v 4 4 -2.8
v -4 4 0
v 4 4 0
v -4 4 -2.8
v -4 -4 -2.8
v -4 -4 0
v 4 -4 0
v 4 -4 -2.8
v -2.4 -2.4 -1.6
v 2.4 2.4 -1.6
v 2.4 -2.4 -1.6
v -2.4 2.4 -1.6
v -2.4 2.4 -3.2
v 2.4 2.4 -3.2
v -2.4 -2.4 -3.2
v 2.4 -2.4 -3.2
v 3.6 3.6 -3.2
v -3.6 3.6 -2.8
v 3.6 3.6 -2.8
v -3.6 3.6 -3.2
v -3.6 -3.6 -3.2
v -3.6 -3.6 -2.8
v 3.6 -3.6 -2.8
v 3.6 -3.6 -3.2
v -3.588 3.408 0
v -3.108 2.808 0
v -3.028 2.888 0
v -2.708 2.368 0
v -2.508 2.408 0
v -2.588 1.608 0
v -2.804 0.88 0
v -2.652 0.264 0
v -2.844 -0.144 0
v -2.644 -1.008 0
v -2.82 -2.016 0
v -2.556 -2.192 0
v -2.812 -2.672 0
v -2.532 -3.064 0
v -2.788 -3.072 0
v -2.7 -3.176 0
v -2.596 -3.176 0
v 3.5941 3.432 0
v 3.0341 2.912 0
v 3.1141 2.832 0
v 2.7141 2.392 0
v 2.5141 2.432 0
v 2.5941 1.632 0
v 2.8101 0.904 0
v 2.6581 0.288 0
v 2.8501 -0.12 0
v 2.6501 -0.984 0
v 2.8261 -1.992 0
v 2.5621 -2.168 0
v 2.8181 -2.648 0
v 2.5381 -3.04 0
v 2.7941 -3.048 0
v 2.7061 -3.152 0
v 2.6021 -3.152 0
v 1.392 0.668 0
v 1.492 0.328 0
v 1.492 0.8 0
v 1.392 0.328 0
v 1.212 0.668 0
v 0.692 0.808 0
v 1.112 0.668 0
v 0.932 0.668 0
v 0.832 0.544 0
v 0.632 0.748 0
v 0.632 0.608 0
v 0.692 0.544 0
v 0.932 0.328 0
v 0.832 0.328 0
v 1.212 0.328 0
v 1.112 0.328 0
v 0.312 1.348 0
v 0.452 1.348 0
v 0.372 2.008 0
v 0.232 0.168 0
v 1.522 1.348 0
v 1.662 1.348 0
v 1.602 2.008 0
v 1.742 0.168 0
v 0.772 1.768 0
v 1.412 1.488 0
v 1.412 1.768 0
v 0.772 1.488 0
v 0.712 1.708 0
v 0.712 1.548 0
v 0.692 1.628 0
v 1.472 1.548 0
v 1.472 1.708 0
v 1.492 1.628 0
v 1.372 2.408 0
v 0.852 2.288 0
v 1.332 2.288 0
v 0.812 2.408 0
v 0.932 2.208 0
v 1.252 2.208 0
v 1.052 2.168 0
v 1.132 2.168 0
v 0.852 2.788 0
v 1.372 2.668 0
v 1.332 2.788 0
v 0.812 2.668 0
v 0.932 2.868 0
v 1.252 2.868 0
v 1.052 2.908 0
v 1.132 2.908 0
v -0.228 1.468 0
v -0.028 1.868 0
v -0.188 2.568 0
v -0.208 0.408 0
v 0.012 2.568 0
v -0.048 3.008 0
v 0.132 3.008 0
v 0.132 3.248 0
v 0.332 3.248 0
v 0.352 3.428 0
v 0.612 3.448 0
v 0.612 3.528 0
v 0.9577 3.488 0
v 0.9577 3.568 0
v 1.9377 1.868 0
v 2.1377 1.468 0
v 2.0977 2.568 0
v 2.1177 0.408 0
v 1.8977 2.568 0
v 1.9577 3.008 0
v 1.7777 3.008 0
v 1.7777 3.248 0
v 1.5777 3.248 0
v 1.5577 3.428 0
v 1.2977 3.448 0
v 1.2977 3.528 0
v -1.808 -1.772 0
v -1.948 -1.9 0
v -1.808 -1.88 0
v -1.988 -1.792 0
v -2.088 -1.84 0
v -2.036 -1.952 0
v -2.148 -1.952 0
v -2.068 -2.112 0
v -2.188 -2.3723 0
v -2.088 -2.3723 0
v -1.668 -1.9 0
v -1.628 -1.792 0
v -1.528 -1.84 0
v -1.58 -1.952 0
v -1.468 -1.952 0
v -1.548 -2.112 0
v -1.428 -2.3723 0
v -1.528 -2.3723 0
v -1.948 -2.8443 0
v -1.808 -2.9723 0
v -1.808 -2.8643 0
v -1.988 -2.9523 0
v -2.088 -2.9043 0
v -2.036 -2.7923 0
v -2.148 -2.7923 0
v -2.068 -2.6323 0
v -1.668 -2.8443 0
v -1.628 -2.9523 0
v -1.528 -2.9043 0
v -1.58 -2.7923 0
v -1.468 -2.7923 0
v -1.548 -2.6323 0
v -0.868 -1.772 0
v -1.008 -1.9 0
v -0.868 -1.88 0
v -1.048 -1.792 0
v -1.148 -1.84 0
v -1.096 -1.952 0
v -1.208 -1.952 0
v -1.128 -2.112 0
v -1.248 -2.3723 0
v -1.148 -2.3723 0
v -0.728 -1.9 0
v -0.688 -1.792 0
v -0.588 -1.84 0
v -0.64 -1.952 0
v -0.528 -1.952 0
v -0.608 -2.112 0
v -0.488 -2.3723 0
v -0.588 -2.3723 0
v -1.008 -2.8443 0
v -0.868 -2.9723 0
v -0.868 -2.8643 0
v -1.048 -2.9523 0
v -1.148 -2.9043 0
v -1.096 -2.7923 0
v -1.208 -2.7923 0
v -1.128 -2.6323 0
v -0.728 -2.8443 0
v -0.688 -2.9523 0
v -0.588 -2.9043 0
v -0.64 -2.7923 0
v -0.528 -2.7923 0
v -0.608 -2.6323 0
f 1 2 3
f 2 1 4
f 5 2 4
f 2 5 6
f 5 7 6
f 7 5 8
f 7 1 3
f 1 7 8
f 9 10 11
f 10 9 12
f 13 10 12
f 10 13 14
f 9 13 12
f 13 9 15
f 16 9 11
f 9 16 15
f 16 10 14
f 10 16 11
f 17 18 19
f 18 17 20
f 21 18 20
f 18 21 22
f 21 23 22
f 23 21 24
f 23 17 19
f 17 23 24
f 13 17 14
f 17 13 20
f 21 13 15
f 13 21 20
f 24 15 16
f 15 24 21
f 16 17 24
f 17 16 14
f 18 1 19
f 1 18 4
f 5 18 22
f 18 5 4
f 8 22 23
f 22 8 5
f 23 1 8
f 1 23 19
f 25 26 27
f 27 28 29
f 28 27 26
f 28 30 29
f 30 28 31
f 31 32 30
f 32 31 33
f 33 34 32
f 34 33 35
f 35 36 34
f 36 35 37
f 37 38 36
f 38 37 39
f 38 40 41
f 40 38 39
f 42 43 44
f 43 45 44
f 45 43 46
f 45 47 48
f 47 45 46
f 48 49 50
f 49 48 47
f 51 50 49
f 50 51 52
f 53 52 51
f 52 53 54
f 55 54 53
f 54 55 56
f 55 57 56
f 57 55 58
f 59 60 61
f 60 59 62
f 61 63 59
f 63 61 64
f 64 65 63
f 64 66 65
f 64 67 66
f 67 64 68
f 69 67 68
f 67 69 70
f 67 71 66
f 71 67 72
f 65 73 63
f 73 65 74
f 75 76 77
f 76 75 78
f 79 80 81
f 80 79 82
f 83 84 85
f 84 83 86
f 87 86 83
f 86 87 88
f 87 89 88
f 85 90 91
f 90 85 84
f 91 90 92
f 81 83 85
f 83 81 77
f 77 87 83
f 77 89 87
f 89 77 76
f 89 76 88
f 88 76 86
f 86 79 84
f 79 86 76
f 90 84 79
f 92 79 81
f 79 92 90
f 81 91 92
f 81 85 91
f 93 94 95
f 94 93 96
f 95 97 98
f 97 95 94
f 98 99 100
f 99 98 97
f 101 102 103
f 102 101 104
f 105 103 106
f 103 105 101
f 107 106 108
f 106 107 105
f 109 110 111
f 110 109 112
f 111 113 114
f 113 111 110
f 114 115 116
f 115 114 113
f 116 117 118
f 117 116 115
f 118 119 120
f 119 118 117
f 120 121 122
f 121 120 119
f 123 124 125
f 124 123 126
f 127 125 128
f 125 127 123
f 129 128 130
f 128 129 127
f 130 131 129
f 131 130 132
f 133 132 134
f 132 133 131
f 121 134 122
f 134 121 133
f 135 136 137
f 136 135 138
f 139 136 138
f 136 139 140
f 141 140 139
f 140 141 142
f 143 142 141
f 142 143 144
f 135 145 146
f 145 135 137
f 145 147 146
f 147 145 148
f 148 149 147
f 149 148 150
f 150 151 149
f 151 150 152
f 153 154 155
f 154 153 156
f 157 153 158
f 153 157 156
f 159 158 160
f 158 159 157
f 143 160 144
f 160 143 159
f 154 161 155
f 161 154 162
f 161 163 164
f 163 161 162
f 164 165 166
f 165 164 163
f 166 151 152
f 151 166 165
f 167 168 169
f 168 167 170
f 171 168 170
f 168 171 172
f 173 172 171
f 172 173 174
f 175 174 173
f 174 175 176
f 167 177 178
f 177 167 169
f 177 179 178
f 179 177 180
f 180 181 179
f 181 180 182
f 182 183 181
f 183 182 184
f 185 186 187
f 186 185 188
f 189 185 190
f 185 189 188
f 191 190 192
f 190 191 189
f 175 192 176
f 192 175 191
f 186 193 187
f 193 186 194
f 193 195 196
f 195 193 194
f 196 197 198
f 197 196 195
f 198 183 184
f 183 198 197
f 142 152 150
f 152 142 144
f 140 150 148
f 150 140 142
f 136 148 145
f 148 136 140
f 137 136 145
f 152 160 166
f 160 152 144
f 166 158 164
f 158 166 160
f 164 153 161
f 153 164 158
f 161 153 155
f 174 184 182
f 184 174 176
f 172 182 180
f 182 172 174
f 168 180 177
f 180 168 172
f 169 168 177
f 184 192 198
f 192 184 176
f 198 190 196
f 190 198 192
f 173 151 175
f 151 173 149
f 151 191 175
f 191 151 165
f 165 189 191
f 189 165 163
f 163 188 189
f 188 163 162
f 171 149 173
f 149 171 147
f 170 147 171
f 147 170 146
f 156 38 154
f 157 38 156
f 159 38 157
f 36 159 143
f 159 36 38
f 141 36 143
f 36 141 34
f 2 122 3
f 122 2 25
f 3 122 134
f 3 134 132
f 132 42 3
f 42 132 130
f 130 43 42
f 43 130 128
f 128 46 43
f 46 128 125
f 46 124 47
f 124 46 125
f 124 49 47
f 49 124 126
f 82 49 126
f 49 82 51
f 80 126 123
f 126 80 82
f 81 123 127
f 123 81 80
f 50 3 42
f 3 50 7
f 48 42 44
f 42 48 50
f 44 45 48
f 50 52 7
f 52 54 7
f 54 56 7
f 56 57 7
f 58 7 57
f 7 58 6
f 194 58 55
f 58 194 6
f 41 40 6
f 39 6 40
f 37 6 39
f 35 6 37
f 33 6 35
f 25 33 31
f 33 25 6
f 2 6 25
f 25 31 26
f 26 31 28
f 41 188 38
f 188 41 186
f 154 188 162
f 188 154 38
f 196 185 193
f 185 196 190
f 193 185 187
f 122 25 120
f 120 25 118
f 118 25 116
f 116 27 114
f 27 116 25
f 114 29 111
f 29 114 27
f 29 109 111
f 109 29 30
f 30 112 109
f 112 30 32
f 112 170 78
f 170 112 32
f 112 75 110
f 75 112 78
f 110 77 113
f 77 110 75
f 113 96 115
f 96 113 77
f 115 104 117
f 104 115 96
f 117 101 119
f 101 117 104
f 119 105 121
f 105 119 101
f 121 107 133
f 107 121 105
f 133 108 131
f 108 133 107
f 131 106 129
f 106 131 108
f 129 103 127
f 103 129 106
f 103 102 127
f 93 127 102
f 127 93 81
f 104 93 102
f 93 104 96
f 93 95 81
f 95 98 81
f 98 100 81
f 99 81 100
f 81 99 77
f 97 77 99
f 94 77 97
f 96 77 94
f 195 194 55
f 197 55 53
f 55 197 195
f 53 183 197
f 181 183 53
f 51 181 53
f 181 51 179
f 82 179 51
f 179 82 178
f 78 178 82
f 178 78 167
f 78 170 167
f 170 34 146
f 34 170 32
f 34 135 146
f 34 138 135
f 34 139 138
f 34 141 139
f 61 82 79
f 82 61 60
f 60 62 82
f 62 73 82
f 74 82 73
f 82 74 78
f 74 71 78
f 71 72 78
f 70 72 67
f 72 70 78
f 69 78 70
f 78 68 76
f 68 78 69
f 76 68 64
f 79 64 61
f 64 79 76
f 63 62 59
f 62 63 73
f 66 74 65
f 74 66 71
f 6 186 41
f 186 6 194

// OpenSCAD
// file: ../p/box5.scad
use <../lib.scad>
function ldraw_lib__box5() = [
// 0 Box with 5 Faces and All Edges
// 0 Name: box5.dat
// 0 Author: James Jessiman
// 0 !LDRAW_ORG Primitive UPDATE 2012-01
// 0 !LICENSE Licensed under CC BY 4.0 : see CAreadme.txt
// 
// 0 BFC CERTIFY CCW
  [0,"BFC","CERTIFY"],
  [0,"BFC","CCW"],
// 
// 0 !HISTORY 2002-04-03 [sbliss] Modified for BFC compliance
// 0 !HISTORY 2002-04-25 [PTadmin] Official Update 2002-02
// 0 !HISTORY 2007-06-24 [PTadmin] Header formatted for Contributor Agreement
// 0 !HISTORY 2008-07-01 [PTadmin] Official Update 2008-01
// 0 !HISTORY 2012-02-16 [Philo] Changed to CCW
// 0 !HISTORY 2012-03-30 [PTadmin] Official Update 2012-01
// 
// 
// 2 24 1 1 1 -1 1 1
  [2,24,1,1,1,-1,1,1],
// 2 24 -1 1 1 -1 1 -1
  [2,24,-1,1,1,-1,1,-1],
// 2 24 -1 1 -1 1 1 -1
  [2,24,-1,1,-1,1,1,-1],
// 2 24 1 1 -1 1 1 1
  [2,24,1,1,-1,1,1,1],
// 2 24 1 0 1 -1 0 1
  [2,24,1,0,1,-1,0,1],
// 2 24 -1 0 1 -1 0 -1
  [2,24,-1,0,1,-1,0,-1],
// 2 24 -1 0 -1 1 0 -1
  [2,24,-1,0,-1,1,0,-1],
// 2 24 1 0 -1 1 0 1
  [2,24,1,0,-1,1,0,1],
// 2 24 1 0 1 1 1 1
  [2,24,1,0,1,1,1,1],
// 2 24 -1 0 1 -1 1 1
  [2,24,-1,0,1,-1,1,1],
// 2 24 1 0 -1 1 1 -1
  [2,24,1,0,-1,1,1,-1],
// 2 24 -1 0 -1 -1 1 -1
  [2,24,-1,0,-1,-1,1,-1],
// 4 16 -1 1 1 1 1 1 1 1 -1 -1 1 -1
  [4,16,-1,1,1,1,1,1,1,1,-1,-1,1,-1],
// 4 16 -1 1 1 -1 0 1 1 0 1 1 1 1
  [4,16,-1,1,1,-1,0,1,1,0,1,1,1,1],
// 4 16 -1 1 -1 -1 0 -1 -1 0 1 -1 1 1
  [4,16,-1,1,-1,-1,0,-1,-1,0,1,-1,1,1],
// 4 16 1 1 -1 1 0 -1 -1 0 -1 -1 1 -1
  [4,16,1,1,-1,1,0,-1,-1,0,-1,-1,1,-1],
// 4 16 1 1 1 1 0 1 1 0 -1 1 1 -1
  [4,16,1,1,1,1,0,1,1,0,-1,1,1,-1],
];
module ldraw_lib__box5(step=0, col=false, unit=2/5, alt=false, line=0.2, solid=!$preview)
    makepoly(ldraw_lib__box5(), step=step, col=col, unit=unit, alt=alt, line=line, solid=solid);
ldraw_lib__box5(line=0.2);
// file: ../p/box4.scad
use <../lib.scad>
function ldraw_lib__box4() = [
// 0 Box with 4 Faces (2 Parallel Pairs) and All Edges
// 0 Name: box4.dat
// 0 Author: James Jessiman
// 0 !LDRAW_ORG Primitive UPDATE 2012-01
// 0 !LICENSE Licensed under CC BY 4.0 : see CAreadme.txt
// 
// 0 BFC CERTIFY CCW
  [0,"BFC","CERTIFY"],
  [0,"BFC","CCW"],
// 
// 0 !HISTORY 2002-04-03 [sbliss] Modified for BFC compliance
// 0 !HISTORY 2002-04-25 [PTadmin] Official Update 2002-02
// 0 !HISTORY 2007-06-24 [PTadmin] Header formatted for Contributor Agreement
// 0 !HISTORY 2008-07-01 [PTadmin] Official Update 2008-01
// 0 !HISTORY 2012-02-16 [Philo] Changed to CCW
// 0 !HISTORY 2012-03-30 [PTadmin] Official Update 2012-01
// 
// 
// 2 24 1 1 1 -1 1 1
  [2,24,1,1,1,-1,1,1],
// 2 24 -1 1 1 -1 1 -1
  [2,24,-1,1,1,-1,1,-1],
// 2 24 -1 1 -1 1 1 -1
  [2,24,-1,1,-1,1,1,-1],
// 2 24 1 1 -1 1 1 1
  [2,24,1,1,-1,1,1,1],
// 2 24 1 0 1 -1 0 1
  [2,24,1,0,1,-1,0,1],
// 2 24 -1 0 1 -1 0 -1
  [2,24,-1,0,1,-1,0,-1],
// 2 24 -1 0 -1 1 0 -1
  [2,24,-1,0,-1,1,0,-1],
// 2 24 1 0 -1 1 0 1
  [2,24,1,0,-1,1,0,1],
// 2 24 1 0 1 1 1 1
  [2,24,1,0,1,1,1,1],
// 2 24 -1 0 1 -1 1 1
  [2,24,-1,0,1,-1,1,1],
// 2 24 1 0 -1 1 1 -1
  [2,24,1,0,-1,1,1,-1],
// 2 24 -1 0 -1 -1 1 -1
  [2,24,-1,0,-1,-1,1,-1],
// 4 16 -1 1 1 -1 0 1 1 0 1 1 1 1
  [4,16,-1,1,1,-1,0,1,1,0,1,1,1,1],
// 4 16 -1 1 -1 -1 0 -1 -1 0 1 -1 1 1
  [4,16,-1,1,-1,-1,0,-1,-1,0,1,-1,1,1],
// 4 16 1 1 -1 1 0 -1 -1 0 -1 -1 1 -1
  [4,16,1,1,-1,1,0,-1,-1,0,-1,-1,1,-1],
// 4 16 1 1 1 1 0 1 1 0 -1 1 1 -1
  [4,16,1,1,1,1,0,1,1,0,-1,1,1,-1],
];
module ldraw_lib__box4(step=0, col=false, unit=2/5, alt=false, line=0.2, solid=!$preview)
    makepoly(ldraw_lib__box4(), step=step, col=col, unit=unit, alt=alt, line=line, solid=solid);
ldraw_lib__box4(line=0.2);
// file: s/3070bs01.scad
use <../../lib.scad>
use <../../p/box4.scad>
use <../../p/box5.scad>
function ldraw_lib__s__3070bs01() = [
// 0 ~Tile  1 x  1 with Groove without Top Face
// 0 Name: s\3070bs01.dat
// 0 Author: Chris Dee [cwdee]
// 0 !LDRAW_ORG Subpart UPDATE 2009-02
// 0 !LICENSE Licensed under CC BY 4.0 : see CAreadme.txt
// 
// 0 BFC CERTIFY CCW
  [0,"BFC","CERTIFY"],
  [0,"BFC","CCW"],
// 
// 0 !HISTORY 2009-09-03 [PTadmin] Official Update 2009-02
// 
// 
// 1 16 0 0 0 10 0 0 0 7 0 0 0 10 box4.dat
  [1,16,0,0,0,10,0,0,0,7,0,0,0,10, ldraw_lib__box4()],
// 0 BFC INVERTNEXT
  [0,"BFC","INVERTNEXT"],
// 1 16 0 8 0 6 0 0 0 -4 0 0 0 6 box5.dat
  [1,16,0,8,0,6,0,0,0,-4,0,0,0,6, ldraw_lib__box5()],
// 1 16 0 7 0 9 0 0 0 1 0 0 0 9 box4.dat
  [1,16,0,7,0,9,0,0,0,1,0,0,0,9, ldraw_lib__box4()],
// 
// 4 16 9 8 9 6 8 6 -6 8 6 -9 8 9
  [4,16,9,8,9,6,8,6,-6,8,6,-9,8,9],
// 4 16 -9 8 9 -6 8 6 -6 8 -6 -9 8 -9
  [4,16,-9,8,9,-6,8,6,-6,8,-6,-9,8,-9],
// 4 16 -9 8 -9 -6 8 -6 6 8 -6 9 8 -9
  [4,16,-9,8,-9,-6,8,-6,6,8,-6,9,8,-9],
// 4 16 9 8 -9 6 8 -6 6 8 6 9 8 9
  [4,16,9,8,-9,6,8,-6,6,8,6,9,8,9],
// 
// 4 16 10 7 10 9 7 9 -9 7 9 -10 7 10
  [4,16,10,7,10,9,7,9,-9,7,9,-10,7,10],
// 4 16 -10 7 10 -9 7 9 -9 7 -9 -10 7 -10
  [4,16,-10,7,10,-9,7,9,-9,7,-9,-10,7,-10],
// 4 16 -10 7 -10 -9 7 -9 9 7 -9 10 7 -10
  [4,16,-10,7,-10,-9,7,-9,9,7,-9,10,7,-10],
// 4 16 10 7 -10 9 7 -9 9 7 9 10 7 10
  [4,16,10,7,-10,9,7,-9,9,7,9,10,7,10],
// 0
];
module ldraw_lib__s__3070bs01(step=0, col=false, unit=2/5, alt=false, line=0.2, solid=!$preview)
    makepoly(ldraw_lib__s__3070bs01(), step=step, col=col, unit=unit, alt=alt, line=line, solid=solid);
ldraw_lib__s__3070bs01(line=0.2);
// main file
use <../lib.scad>
use <s/3070bs01.scad>
function ldraw_lib__3070bps4() = [
// 0 Tile  1 x  1 with SW First Order Backpack Pattern
// 0 Name: 3070bps4.dat
// 0 Author: Bertrand Lequy [Berth]
// 0 !LDRAW_ORG Part UPDATE 2016-01
// 0 !LICENSE Licensed under CC BY 4.0 : see CAreadme.txt
// 
// 0 BFC CERTIFY CCW
  [0,"BFC","CERTIFY"],
  [0,"BFC","CCW"],
// 
// 0 !HISTORY 2016-12-31 [PTadmin] Official Update 2016-01
// 
// 
// 1 16 0 0 0 1 0 0 0 1 0 0 0 1 s\3070bs01.dat
  [1,16,0,0,0,1,0,0,0,1,0,0,0,1, ldraw_lib__s__3070bs01()],
// 
// 3 71 -8.97 0 8.52 -7.77 0 7.02 -7.57 0 7.22
  [3,71,-8.97,0,8.52,-7.77,0,7.02,-7.57,0,7.22],
// 4 71 -6.27 0 6.02 -7.57 0 7.22 -7.77 0 7.02 -6.77 0 5.92
  [4,71,-6.27,0,6.02,-7.57,0,7.22,-7.77,0,7.02,-6.77,0,5.92],
// 4 71 -6.47 0 4.02 -6.27 0 6.02 -6.77 0 5.92 -7.01 0 2.2
  [4,71,-6.47,0,4.02,-6.27,0,6.02,-6.77,0,5.92,-7.01,0,2.2],
// 4 71 -6.63 0 0.66 -6.47 0 4.02 -7.01 0 2.2 -7.11 0 -0.36
  [4,71,-6.63,0,0.66,-6.47,0,4.02,-7.01,0,2.2,-7.11,0,-0.36],
// 4 71 -6.61 0 -2.52 -6.63 0 0.66 -7.11 0 -0.36 -7.05 0 -5.04
  [4,71,-6.61,0,-2.52,-6.63,0,0.66,-7.11,0,-0.36,-7.05,0,-5.04],
// 4 71 -6.39 0 -5.48 -6.61 0 -2.52 -7.05 0 -5.04 -7.03 0 -6.68
  [4,71,-6.39,0,-5.48,-6.61,0,-2.52,-7.05,0,-5.04,-7.03,0,-6.68],
// 4 71 -6.39 0 -5.48 -7.03 0 -6.68 -6.97 0 -7.68 -6.33 0 -7.66
  [4,71,-6.39,0,-5.48,-7.03,0,-6.68,-6.97,0,-7.68,-6.33,0,-7.66],
// 4 71 -6.33 0 -7.66 -6.97 0 -7.68 -6.75 0 -7.94 -6.49 0 -7.94
  [4,71,-6.33,0,-7.66,-6.97,0,-7.68,-6.75,0,-7.94,-6.49,0,-7.94],
// 3 71 8.98529 0 8.58 7.58529 0 7.28 7.78529 0 7.08
  [3,71,8.98529,0,8.58,7.58529,0,7.28,7.78529,0,7.08],
// 4 71 7.78529 0 7.08 7.58529 0 7.28 6.28529 0 6.08 6.78529 0 5.98
  [4,71,7.78529,0,7.08,7.58529,0,7.28,6.28529,0,6.08,6.78529,0,5.98],
// 4 71 6.78529 0 5.98 6.28529 0 6.08 6.48529 0 4.08 7.02529 0 2.26
  [4,71,6.78529,0,5.98,6.28529,0,6.08,6.48529,0,4.08,7.02529,0,2.26],
// 4 71 7.02529 0 2.26 6.48529 0 4.08 6.64529 0 0.72 7.12529 0 -0.3
  [4,71,7.02529,0,2.26,6.48529,0,4.08,6.64529,0,0.72,7.12529,0,-0.3],
// 4 71 7.12529 0 -0.3 6.64529 0 0.72 6.62529 0 -2.46 7.06529 0 -4.98
  [4,71,7.12529,0,-0.3,6.64529,0,0.72,6.62529,0,-2.46,7.06529,0,-4.98],
// 4 71 7.06529 0 -4.98 6.62529 0 -2.46 6.40529 0 -5.42 7.04529 0 -6.62
  [4,71,7.06529,0,-4.98,6.62529,0,-2.46,6.40529,0,-5.42,7.04529,0,-6.62],
// 4 71 6.98529 0 -7.62 7.04529 0 -6.62 6.40529 0 -5.42 6.34529 0 -7.6
  [4,71,6.98529,0,-7.62,7.04529,0,-6.62,6.40529,0,-5.42,6.34529,0,-7.6],
// 4 71 6.76529 0 -7.88 6.98529 0 -7.62 6.34529 0 -7.6 6.50529 0 -7.88
  [4,71,6.76529,0,-7.88,6.98529,0,-7.62,6.34529,0,-7.6,6.50529,0,-7.88],
// 4 0 3.48 0 0.82 3.73 0 0.82 3.73 0 2 3.48 0 1.67
  [4,0,3.48,0,0.82,3.73,0,0.82,3.73,0,2,3.48,0,1.67],
// 4 0 3.03 0 1.67 3.48 0 1.67 3.73 0 2 1.73 0 2.02
  [4,0,3.03,0,1.67,3.48,0,1.67,3.73,0,2,1.73,0,2.02],
// 3 0 1.73 0 2.02 2.78 0 1.67 3.03 0 1.67
  [3,0,1.73,0,2.02,2.78,0,1.67,3.03,0,1.67],
// 3 0 1.73 0 2.02 2.33 0 1.67 2.78 0 1.67
  [3,0,1.73,0,2.02,2.33,0,1.67,2.78,0,1.67],
// 4 0 2.08 0 1.36 2.33 0 1.67 1.73 0 2.02 1.58 0 1.87
  [4,0,2.08,0,1.36,2.33,0,1.67,1.73,0,2.02,1.58,0,1.87],
// 4 0 1.73 0 1.36 2.08 0 1.36 1.58 0 1.87 1.58 0 1.52
  [4,0,1.73,0,1.36,2.08,0,1.36,1.58,0,1.87,1.58,0,1.52],
// 4 0 2.08 0 1.36 2.08 0 0.82 2.33 0 0.82 2.33 0 1.67
  [4,0,2.08,0,1.36,2.08,0,0.82,2.33,0,0.82,2.33,0,1.67],
// 4 0 3.03 0 1.67 2.78 0 1.67 2.78 0 0.82 3.03 0 0.82
  [4,0,3.03,0,1.67,2.78,0,1.67,2.78,0,0.82,3.03,0,0.82],
// 4 72 0.78 0 3.37 0.58 0 0.42 1.13 0 3.37 0.93 0 5.02
  [4,72,0.78,0,3.37,0.58,0,0.42,1.13,0,3.37,0.93,0,5.02],
// 4 72 3.805 0 3.37 4.355 0 0.42 4.155 0 3.37 4.005 0 5.02
  [4,72,3.805,0,3.37,4.355,0,0.42,4.155,0,3.37,4.005,0,5.02],
// 4 0 3.53 0 3.72 3.53 0 4.42 1.93 0 4.42 1.93 0 3.72
  [4,0,3.53,0,3.72,3.53,0,4.42,1.93,0,4.42,1.93,0,3.72],
// 4 0 1.78 0 3.87 1.93 0 3.72 1.93 0 4.42 1.78 0 4.27
  [4,0,1.78,0,3.87,1.93,0,3.72,1.93,0,4.42,1.78,0,4.27],
// 3 0 1.78 0 4.27 1.73 0 4.07 1.78 0 3.87
  [3,0,1.78,0,4.27,1.73,0,4.07,1.78,0,3.87],
// 4 0 3.53 0 4.42 3.53 0 3.72 3.68 0 3.87 3.68 0 4.27
  [4,0,3.53,0,4.42,3.53,0,3.72,3.68,0,3.87,3.68,0,4.27],
// 3 0 3.68 0 4.27 3.68 0 3.87 3.73 0 4.07
  [3,0,3.68,0,4.27,3.68,0,3.87,3.73,0,4.07],
// 4 72 3.53 0 4.42 4.005 0 5.02 0.93 0 5.02 1.93 0 4.42
  [4,72,3.53,0,4.42,4.005,0,5.02,0.93,0,5.02,1.93,0,4.42],
// 3 72 0.93 0 5.02 1.78 0 4.27 1.93 0 4.42
  [3,72,0.93,0,5.02,1.78,0,4.27,1.93,0,4.42],
// 4 72 1.73 0 4.07 1.78 0 4.27 0.93 0 5.02 1.13 0 3.37
  [4,72,1.73,0,4.07,1.78,0,4.27,0.93,0,5.02,1.13,0,3.37],
// 3 72 1.73 0 4.07 1.13 0 3.37 1.78 0 3.87
  [3,72,1.73,0,4.07,1.13,0,3.37,1.78,0,3.87],
// 3 72 1.78 0 3.87 1.13 0 3.37 1.93 0 3.72
  [3,72,1.78,0,3.87,1.13,0,3.37,1.93,0,3.72],
// 4 72 1.93 0 3.72 1.13 0 3.37 3.805 0 3.37 3.53 0 3.72
  [4,72,1.93,0,3.72,1.13,0,3.37,3.805,0,3.37,3.53,0,3.72],
// 3 72 3.68 0 3.87 3.53 0 3.72 3.805 0 3.37
  [3,72,3.68,0,3.87,3.53,0,3.72,3.805,0,3.37],
// 4 72 3.73 0 4.07 3.68 0 3.87 3.805 0 3.37 4.005 0 5.02
  [4,72,3.73,0,4.07,3.68,0,3.87,3.805,0,3.37,4.005,0,5.02],
// 3 72 4.005 0 5.02 3.68 0 4.27 3.73 0 4.07
  [3,72,4.005,0,5.02,3.68,0,4.27,3.73,0,4.07],
// 3 72 4.005 0 5.02 3.53 0 4.42 3.68 0 4.27
  [3,72,4.005,0,5.02,3.53,0,4.42,3.68,0,4.27],
// 4 0 3.33 0 5.72 3.43 0 6.02 2.03 0 6.02 2.13 0 5.72
  [4,0,3.33,0,5.72,3.43,0,6.02,2.03,0,6.02,2.13,0,5.72],
// 4 0 3.13 0 5.52 3.33 0 5.72 2.13 0 5.72 2.33 0 5.52
  [4,0,3.13,0,5.52,3.33,0,5.72,2.13,0,5.72,2.33,0,5.52],
// 4 0 3.13 0 5.52 2.33 0 5.52 2.63 0 5.42 2.83 0 5.42
  [4,0,3.13,0,5.52,2.33,0,5.52,2.63,0,5.42,2.83,0,5.42],
// 4 0 2.03 0 6.67 3.43 0 6.67 3.33 0 6.97 2.13 0 6.97
  [4,0,2.03,0,6.67,3.43,0,6.67,3.33,0,6.97,2.13,0,6.97],
// 4 0 2.13 0 6.97 3.33 0 6.97 3.13 0 7.17 2.33 0 7.17
  [4,0,2.13,0,6.97,3.33,0,6.97,3.13,0,7.17,2.33,0,7.17],
// 4 0 2.63 0 7.27 2.33 0 7.17 3.13 0 7.17 2.83 0 7.27
  [4,0,2.63,0,7.27,2.33,0,7.17,3.13,0,7.17,2.83,0,7.27],
// 4 71 -0.57 0 3.67 -0.52 0 1.02 -0.07 0 4.67 -0.47 0 6.42
  [4,71,-0.57,0,3.67,-0.52,0,1.02,-0.07,0,4.67,-0.47,0,6.42],
// 4 71 -0.47 0 6.42 -0.07 0 4.67 0.03 0 6.42 -0.12 0 7.52
  [4,71,-0.47,0,6.42,-0.07,0,4.67,0.03,0,6.42,-0.12,0,7.52],
// 4 71 -0.12 0 7.52 0.03 0 6.42 0.33 0 7.52 0.33 0 8.12
  [4,71,-0.12,0,7.52,0.03,0,6.42,0.33,0,7.52,0.33,0,8.12],
// 4 71 0.33 0 8.12 0.33 0 7.52 0.83 0 8.12 0.88 0 8.57
  [4,71,0.33,0,8.12,0.33,0,7.52,0.83,0,8.12,0.88,0,8.57],
// 4 71 0.88 0 8.57 0.83 0 8.12 1.53 0 8.62 1.53 0 8.82
  [4,71,0.88,0,8.57,0.83,0,8.12,1.53,0,8.62,1.53,0,8.82],
// 4 71 2.39429 0 8.92 1.53 0 8.82 1.53 0 8.62 2.39429 0 8.72
  [4,71,2.39429,0,8.92,1.53,0,8.82,1.53,0,8.62,2.39429,0,8.72],
// 4 71 4.84429 0 4.67 5.29429 0 1.02 5.34429 0 3.67 5.24429 0 6.42
  [4,71,4.84429,0,4.67,5.29429,0,1.02,5.34429,0,3.67,5.24429,0,6.42],
// 4 71 4.74429 0 6.42 4.84429 0 4.67 5.24429 0 6.42 4.89429 0 7.52
  [4,71,4.74429,0,6.42,4.84429,0,4.67,5.24429,0,6.42,4.89429,0,7.52],
// 4 71 4.44429 0 7.52 4.74429 0 6.42 4.89429 0 7.52 4.44429 0 8.12
  [4,71,4.44429,0,7.52,4.74429,0,6.42,4.89429,0,7.52,4.44429,0,8.12],
// 4 71 3.94429 0 8.12 4.44429 0 7.52 4.44429 0 8.12 3.89429 0 8.57
  [4,71,3.94429,0,8.12,4.44429,0,7.52,4.44429,0,8.12,3.89429,0,8.57],
// 4 71 3.24429 0 8.62 3.94429 0 8.12 3.89429 0 8.57 3.24429 0 8.82
  [4,71,3.24429,0,8.62,3.94429,0,8.12,3.89429,0,8.57,3.24429,0,8.82],
// 4 71 3.24429 0 8.62 3.24429 0 8.82 2.39429 0 8.92 2.39429 0 8.72
  [4,71,3.24429,0,8.62,3.24429,0,8.82,2.39429,0,8.92,2.39429,0,8.72],
// 4 71 -4.52 0 -4.7 -4.52 0 -4.43 -4.97 0 -4.48 -4.87 0 -4.75
  [4,71,-4.52,0,-4.7,-4.52,0,-4.43,-4.97,0,-4.48,-4.87,0,-4.75],
// 4 71 -4.87 0 -4.75 -4.97 0 -4.48 -5.22 0 -4.6 -5.09 0 -4.88
  [4,71,-4.87,0,-4.75,-4.97,0,-4.48,-5.22,0,-4.6,-5.09,0,-4.88],
// 4 71 -5.09 0 -4.88 -5.22 0 -4.6 -5.37 0 -4.88 -5.17 0 -5.28
  [4,71,-5.09,0,-4.88,-5.22,0,-4.6,-5.37,0,-4.88,-5.17,0,-5.28],
// 4 71 -5.17 0 -5.28 -5.37 0 -4.88 -5.47 0 -5.93067 -5.22 0 -5.93067
  [4,71,-5.17,0,-5.28,-5.37,0,-4.88,-5.47,0,-5.93067,-5.22,0,-5.93067],
// 4 71 -4.07 0 -4.48 -4.52 0 -4.43 -4.52 0 -4.7 -4.17 0 -4.75
  [4,71,-4.07,0,-4.48,-4.52,0,-4.43,-4.52,0,-4.7,-4.17,0,-4.75],
// 4 71 -3.82 0 -4.6 -4.07 0 -4.48 -4.17 0 -4.75 -3.95 0 -4.88
  [4,71,-3.82,0,-4.6,-4.07,0,-4.48,-4.17,0,-4.75,-3.95,0,-4.88],
// 4 71 -3.67 0 -4.88 -3.82 0 -4.6 -3.95 0 -4.88 -3.87 0 -5.28
  [4,71,-3.67,0,-4.88,-3.82,0,-4.6,-3.95,0,-4.88,-3.87,0,-5.28],
// 4 71 -3.57 0 -5.93067 -3.67 0 -4.88 -3.87 0 -5.28 -3.82 0 -5.93067
  [4,71,-3.57,0,-5.93067,-3.67,0,-4.88,-3.87,0,-5.28,-3.82,0,-5.93067],
// 4 71 -4.97 0 -7.38067 -4.52 0 -7.43067 -4.52 0 -7.16067 -4.87 0 -7.11067
  [4,71,-4.97,0,-7.38067,-4.52,0,-7.43067,-4.52,0,-7.16067,-4.87,0,-7.11067],
// 4 71 -5.22 0 -7.26067 -4.97 0 -7.38067 -4.87 0 -7.11067 -5.09 0 -6.98067
  [4,71,-5.22,0,-7.26067,-4.97,0,-7.38067,-4.87,0,-7.11067,-5.09,0,-6.98067],
// 4 71 -5.37 0 -6.98067 -5.22 0 -7.26067 -5.09 0 -6.98067 -5.17 0 -6.58067
  [4,71,-5.37,0,-6.98067,-5.22,0,-7.26067,-5.09,0,-6.98067,-5.17,0,-6.58067],
// 4 71 -5.47 0 -5.93067 -5.37 0 -6.98067 -5.17 0 -6.58067 -5.22 0 -5.93067
  [4,71,-5.47,0,-5.93067,-5.37,0,-6.98067,-5.17,0,-6.58067,-5.22,0,-5.93067],
// 4 71 -4.52 0 -7.16067 -4.52 0 -7.43067 -4.07 0 -7.38067 -4.17 0 -7.11067
  [4,71,-4.52,0,-7.16067,-4.52,0,-7.43067,-4.07,0,-7.38067,-4.17,0,-7.11067],
// 4 71 -4.17 0 -7.11067 -4.07 0 -7.38067 -3.82 0 -7.26067 -3.95 0 -6.98067
  [4,71,-4.17,0,-7.11067,-4.07,0,-7.38067,-3.82,0,-7.26067,-3.95,0,-6.98067],
// 4 71 -3.95 0 -6.98067 -3.82 0 -7.26067 -3.67 0 -6.98067 -3.87 0 -6.58067
  [4,71,-3.95,0,-6.98067,-3.82,0,-7.26067,-3.67,0,-6.98067,-3.87,0,-6.58067],
// 4 71 -3.87 0 -6.58067 -3.67 0 -6.98067 -3.57 0 -5.93067 -3.82 0 -5.93067
  [4,71,-3.87,0,-6.58067,-3.67,0,-6.98067,-3.57,0,-5.93067,-3.82,0,-5.93067],
// 4 71 -2.17 0 -4.7 -2.17 0 -4.43 -2.62 0 -4.48 -2.52 0 -4.75
  [4,71,-2.17,0,-4.7,-2.17,0,-4.43,-2.62,0,-4.48,-2.52,0,-4.75],
// 4 71 -2.52 0 -4.75 -2.62 0 -4.48 -2.87 0 -4.6 -2.74 0 -4.88
  [4,71,-2.52,0,-4.75,-2.62,0,-4.48,-2.87,0,-4.6,-2.74,0,-4.88],
// 4 71 -2.74 0 -4.88 -2.87 0 -4.6 -3.02 0 -4.88 -2.82 0 -5.28
  [4,71,-2.74,0,-4.88,-2.87,0,-4.6,-3.02,0,-4.88,-2.82,0,-5.28],
// 4 71 -2.82 0 -5.28 -3.02 0 -4.88 -3.12 0 -5.93067 -2.87 0 -5.93067
  [4,71,-2.82,0,-5.28,-3.02,0,-4.88,-3.12,0,-5.93067,-2.87,0,-5.93067],
// 4 71 -1.72 0 -4.48 -2.17 0 -4.43 -2.17 0 -4.7 -1.82 0 -4.75
  [4,71,-1.72,0,-4.48,-2.17,0,-4.43,-2.17,0,-4.7,-1.82,0,-4.75],
// 4 71 -1.47 0 -4.6 -1.72 0 -4.48 -1.82 0 -4.75 -1.6 0 -4.88
  [4,71,-1.47,0,-4.6,-1.72,0,-4.48,-1.82,0,-4.75,-1.6,0,-4.88],
// 4 71 -1.32 0 -4.88 -1.47 0 -4.6 -1.6 0 -4.88 -1.52 0 -5.28
  [4,71,-1.32,0,-4.88,-1.47,0,-4.6,-1.6,0,-4.88,-1.52,0,-5.28],
// 4 71 -1.22 0 -5.93067 -1.32 0 -4.88 -1.52 0 -5.28 -1.47 0 -5.93067
  [4,71,-1.22,0,-5.93067,-1.32,0,-4.88,-1.52,0,-5.28,-1.47,0,-5.93067],
// 4 71 -2.62 0 -7.38067 -2.17 0 -7.43067 -2.17 0 -7.16067 -2.52 0 -7.11067
  [4,71,-2.62,0,-7.38067,-2.17,0,-7.43067,-2.17,0,-7.16067,-2.52,0,-7.11067],
// 4 71 -2.87 0 -7.26067 -2.62 0 -7.38067 -2.52 0 -7.11067 -2.74 0 -6.98067
  [4,71,-2.87,0,-7.26067,-2.62,0,-7.38067,-2.52,0,-7.11067,-2.74,0,-6.98067],
// 4 71 -3.02 0 -6.98067 -2.87 0 -7.26067 -2.74 0 -6.98067 -2.82 0 -6.58067
  [4,71,-3.02,0,-6.98067,-2.87,0,-7.26067,-2.74,0,-6.98067,-2.82,0,-6.58067],
// 4 71 -3.12 0 -5.93067 -3.02 0 -6.98067 -2.82 0 -6.58067 -2.87 0 -5.93067
  [4,71,-3.12,0,-5.93067,-3.02,0,-6.98067,-2.82,0,-6.58067,-2.87,0,-5.93067],
// 4 71 -2.17 0 -7.16067 -2.17 0 -7.43067 -1.72 0 -7.38067 -1.82 0 -7.11067
  [4,71,-2.17,0,-7.16067,-2.17,0,-7.43067,-1.72,0,-7.38067,-1.82,0,-7.11067],
// 4 71 -1.82 0 -7.11067 -1.72 0 -7.38067 -1.47 0 -7.26067 -1.6 0 -6.98067
  [4,71,-1.82,0,-7.11067,-1.72,0,-7.38067,-1.47,0,-7.26067,-1.6,0,-6.98067],
// 4 71 -1.6 0 -6.98067 -1.47 0 -7.26067 -1.32 0 -6.98067 -1.52 0 -6.58067
  [4,71,-1.6,0,-6.98067,-1.47,0,-7.26067,-1.32,0,-6.98067,-1.52,0,-6.58067],
// 4 71 -1.52 0 -6.58067 -1.32 0 -6.98067 -1.22 0 -5.93067 -1.47 0 -5.93067
  [4,71,-1.52,0,-6.58067,-1.32,0,-6.98067,-1.22,0,-5.93067,-1.47,0,-5.93067],
// 4 16 -5.22 0 -5.93067 -3.82 0 -5.93067 -3.87 0 -5.28 -5.17 0 -5.28
  [4,16,-5.22,0,-5.93067,-3.82,0,-5.93067,-3.87,0,-5.28,-5.17,0,-5.28],
// 4 16 -5.09 0 -4.88 -5.17 0 -5.28 -3.87 0 -5.28 -3.95 0 -4.88
  [4,16,-5.09,0,-4.88,-5.17,0,-5.28,-3.87,0,-5.28,-3.95,0,-4.88],
// 4 16 -4.87 0 -4.75 -5.09 0 -4.88 -3.95 0 -4.88 -4.17 0 -4.75
  [4,16,-4.87,0,-4.75,-5.09,0,-4.88,-3.95,0,-4.88,-4.17,0,-4.75],
// 3 16 -4.52 0 -4.7 -4.87 0 -4.75 -4.17 0 -4.75
  [3,16,-4.52,0,-4.7,-4.87,0,-4.75,-4.17,0,-4.75],
// 4 16 -3.87 0 -6.58067 -3.82 0 -5.93067 -5.22 0 -5.93067 -5.17 0 -6.58067
  [4,16,-3.87,0,-6.58067,-3.82,0,-5.93067,-5.22,0,-5.93067,-5.17,0,-6.58067],
// 4 16 -3.95 0 -6.98067 -3.87 0 -6.58067 -5.17 0 -6.58067 -5.09 0 -6.98067
  [4,16,-3.95,0,-6.98067,-3.87,0,-6.58067,-5.17,0,-6.58067,-5.09,0,-6.98067],
// 4 16 -4.17 0 -7.11067 -3.95 0 -6.98067 -5.09 0 -6.98067 -4.87 0 -7.11067
  [4,16,-4.17,0,-7.11067,-3.95,0,-6.98067,-5.09,0,-6.98067,-4.87,0,-7.11067],
// 3 16 -4.17 0 -7.11067 -4.87 0 -7.11067 -4.52 0 -7.16067
  [3,16,-4.17,0,-7.11067,-4.87,0,-7.11067,-4.52,0,-7.16067],
// 4 16 -2.82 0 -5.28 -2.87 0 -5.93067 -1.47 0 -5.93067 -1.52 0 -5.28
  [4,16,-2.82,0,-5.28,-2.87,0,-5.93067,-1.47,0,-5.93067,-1.52,0,-5.28],
// 4 16 -2.74 0 -4.88 -2.82 0 -5.28 -1.52 0 -5.28 -1.6 0 -4.88
  [4,16,-2.74,0,-4.88,-2.82,0,-5.28,-1.52,0,-5.28,-1.6,0,-4.88],
// 4 16 -2.52 0 -4.75 -2.74 0 -4.88 -1.6 0 -4.88 -1.82 0 -4.75
  [4,16,-2.52,0,-4.75,-2.74,0,-4.88,-1.6,0,-4.88,-1.82,0,-4.75],
// 3 16 -2.17 0 -4.7 -2.52 0 -4.75 -1.82 0 -4.75
  [3,16,-2.17,0,-4.7,-2.52,0,-4.75,-1.82,0,-4.75],
// 4 16 -1.52 0 -6.58067 -1.47 0 -5.93067 -2.87 0 -5.93067 -2.82 0 -6.58067
  [4,16,-1.52,0,-6.58067,-1.47,0,-5.93067,-2.87,0,-5.93067,-2.82,0,-6.58067],
// 4 16 -1.6 0 -6.98067 -1.52 0 -6.58067 -2.82 0 -6.58067 -2.74 0 -6.98067
  [4,16,-1.6,0,-6.98067,-1.52,0,-6.58067,-2.82,0,-6.58067,-2.74,0,-6.98067],
// 4 16 -3.12 0 -5.93067 -3.02 0 -4.88 -3.67 0 -4.88 -3.57 0 -5.93067
  [4,16,-3.12,0,-5.93067,-3.02,0,-4.88,-3.67,0,-4.88,-3.57,0,-5.93067],
// 4 16 -3.02 0 -6.98067 -3.12 0 -5.93067 -3.57 0 -5.93067 -3.67 0 -6.98067
  [4,16,-3.02,0,-6.98067,-3.12,0,-5.93067,-3.57,0,-5.93067,-3.67,0,-6.98067],
// 4 16 -2.87 0 -7.26067 -3.02 0 -6.98067 -3.67 0 -6.98067 -3.82 0 -7.26067
  [4,16,-2.87,0,-7.26067,-3.02,0,-6.98067,-3.67,0,-6.98067,-3.82,0,-7.26067],
// 4 16 -2.62 0 -7.38067 -2.87 0 -7.26067 -3.82 0 -7.26067 -4.07 0 -7.38067
  [4,16,-2.62,0,-7.38067,-2.87,0,-7.26067,-3.82,0,-7.26067,-4.07,0,-7.38067],
// 4 16 -3.82 0 -4.6 -3.67 0 -4.88 -3.02 0 -4.88 -2.87 0 -4.6
  [4,16,-3.82,0,-4.6,-3.67,0,-4.88,-3.02,0,-4.88,-2.87,0,-4.6],
// 4 16 -4.07 0 -4.48 -3.82 0 -4.6 -2.87 0 -4.6 -2.62 0 -4.48
  [4,16,-4.07,0,-4.48,-3.82,0,-4.6,-2.87,0,-4.6,-2.62,0,-4.48],
// 3 16 -4.97 0 -7.38067 -6.33 0 -7.66 -4.52 0 -7.43067
  [3,16,-4.97,0,-7.38067,-6.33,0,-7.66,-4.52,0,-7.43067],
// 3 16 -5.22 0 -7.26067 -6.33 0 -7.66 -4.97 0 -7.38067
  [3,16,-5.22,0,-7.26067,-6.33,0,-7.66,-4.97,0,-7.38067],
// 3 16 -5.37 0 -6.98067 -6.33 0 -7.66 -5.22 0 -7.26067
  [3,16,-5.37,0,-6.98067,-6.33,0,-7.66,-5.22,0,-7.26067],
// 4 16 -6.33 0 -7.66 -5.37 0 -6.98067 -5.47 0 -5.93067 -6.39 0 -5.48
  [4,16,-6.33,0,-7.66,-5.37,0,-6.98067,-5.47,0,-5.93067,-6.39,0,-5.48],
// 4 16 -5.37 0 -4.88 -6.61 0 -2.52 -6.39 0 -5.48 -5.47 0 -5.93067
  [4,16,-5.37,0,-4.88,-6.61,0,-2.52,-6.39,0,-5.48,-5.47,0,-5.93067],
// 4 16 -10 0 10 -8.97 0 8.52 2.39429 0 8.92 10 0 10
  [4,16,-10,0,10,-8.97,0,8.52,2.39429,0,8.92,10,0,10],
// 3 16 10 0 10 2.39429 0 8.92 3.24429 0 8.82
  [3,16,10,0,10,2.39429,0,8.92,3.24429,0,8.82],
// 3 16 10 0 10 3.24429 0 8.82 3.89429 0 8.57
  [3,16,10,0,10,3.24429,0,8.82,3.89429,0,8.57],
// 4 16 10 0 10 3.89429 0 8.57 4.44429 0 8.12 8.98529 0 8.58
  [4,16,10,0,10,3.89429,0,8.57,4.44429,0,8.12,8.98529,0,8.58],
// 4 16 8.98529 0 8.58 4.44429 0 8.12 4.89429 0 7.52 7.58529 0 7.28
  [4,16,8.98529,0,8.58,4.44429,0,8.12,4.89429,0,7.52,7.58529,0,7.28],
// 4 16 7.58529 0 7.28 4.89429 0 7.52 5.24429 0 6.42 6.28529 0 6.08
  [4,16,7.58529,0,7.28,4.89429,0,7.52,5.24429,0,6.42,6.28529,0,6.08],
// 4 16 6.28529 0 6.08 5.24429 0 6.42 5.34429 0 3.67 6.48529 0 4.08
  [4,16,6.28529,0,6.08,5.24429,0,6.42,5.34429,0,3.67,6.48529,0,4.08],
// 4 16 6.48529 0 4.08 5.34429 0 3.67 5.29429 0 1.02 6.64529 0 0.72
  [4,16,6.48529,0,4.08,5.34429,0,3.67,5.29429,0,1.02,6.64529,0,0.72],
// 4 16 6.64529 0 0.72 5.29429 0 1.02 4.355 0 0.42 6.62529 0 -2.46
  [4,16,6.64529,0,0.72,5.29429,0,1.02,4.355,0,0.42,6.62529,0,-2.46],
// 4 16 4.155 0 3.37 4.355 0 0.42 5.29429 0 1.02 4.84429 0 4.67
  [4,16,4.155,0,3.37,4.355,0,0.42,5.29429,0,1.02,4.84429,0,4.67],
// 4 16 4.005 0 5.02 4.155 0 3.37 4.84429 0 4.67 4.74429 0 6.42
  [4,16,4.005,0,5.02,4.155,0,3.37,4.84429,0,4.67,4.74429,0,6.42],
// 4 16 10 0 -10 10 0 10 8.98529 0 8.58 7.12529 0 -0.3
  [4,16,10,0,-10,10,0,10,8.98529,0,8.58,7.12529,0,-0.3],
// 4 16 7.12529 0 -0.3 8.98529 0 8.58 7.78529 0 7.08 7.02529 0 2.26
  [4,16,7.12529,0,-0.3,8.98529,0,8.58,7.78529,0,7.08,7.02529,0,2.26],
// 3 16 7.78529 0 7.08 6.78529 0 5.98 7.02529 0 2.26
  [3,16,7.78529,0,7.08,6.78529,0,5.98,7.02529,0,2.26],
// 3 16 7.12529 0 -0.3 7.06529 0 -4.98 10 0 -10
  [3,16,7.12529,0,-0.3,7.06529,0,-4.98,10,0,-10],
// 3 16 7.06529 0 -4.98 7.04529 0 -6.62 10 0 -10
  [3,16,7.06529,0,-4.98,7.04529,0,-6.62,10,0,-10],
// 3 16 7.04529 0 -6.62 6.98529 0 -7.62 10 0 -10
  [3,16,7.04529,0,-6.62,6.98529,0,-7.62,10,0,-10],
// 3 16 6.98529 0 -7.62 6.76529 0 -7.88 10 0 -10
  [3,16,6.98529,0,-7.62,6.76529,0,-7.88,10,0,-10],
// 4 16 10 0 -10 6.76529 0 -7.88 6.50529 0 -7.88 -10 0 -10
  [4,16,10,0,-10,6.76529,0,-7.88,6.50529,0,-7.88,-10,0,-10],
// 4 16 -10 0 -10 6.50529 0 -7.88 6.34529 0 -7.6 -1.72 0 -7.38067
  [4,16,-10,0,-10,6.50529,0,-7.88,6.34529,0,-7.6,-1.72,0,-7.38067],
// 3 16 -6.49 0 -7.94 -6.75 0 -7.94 -10 0 -10
  [3,16,-6.49,0,-7.94,-6.75,0,-7.94,-10,0,-10],
// 3 16 -6.97 0 -7.68 -10 0 -10 -6.75 0 -7.94
  [3,16,-6.97,0,-7.68,-10,0,-10,-6.75,0,-7.94],
// 3 16 -7.03 0 -6.68 -10 0 -10 -6.97 0 -7.68
  [3,16,-7.03,0,-6.68,-10,0,-10,-6.97,0,-7.68],
// 3 16 -7.05 0 -5.04 -10 0 -10 -7.03 0 -6.68
  [3,16,-7.05,0,-5.04,-10,0,-10,-7.03,0,-6.68],
// 3 16 -7.11 0 -0.36 -10 0 -10 -7.05 0 -5.04
  [3,16,-7.11,0,-0.36,-10,0,-10,-7.05,0,-5.04],
// 4 16 -10 0 -10 -7.11 0 -0.36 -7.01 0 2.2 -8.97 0 8.52
  [4,16,-10,0,-10,-7.11,0,-0.36,-7.01,0,2.2,-8.97,0,8.52],
// 3 16 -10 0 10 -10 0 -10 -8.97 0 8.52
  [3,16,-10,0,10,-10,0,-10,-8.97,0,8.52],
// 3 16 -8.97 0 8.52 -7.01 0 2.2 -7.77 0 7.02
  [3,16,-8.97,0,8.52,-7.01,0,2.2,-7.77,0,7.02],
// 3 16 -7.77 0 7.02 -7.01 0 2.2 -6.77 0 5.92
  [3,16,-7.77,0,7.02,-7.01,0,2.2,-6.77,0,5.92],
// 4 16 -6.49 0 -7.94 -2.17 0 -7.43067 -2.62 0 -7.38067 -6.33 0 -7.66
  [4,16,-6.49,0,-7.94,-2.17,0,-7.43067,-2.62,0,-7.38067,-6.33,0,-7.66],
// 4 16 -4.52 0 -7.43067 -6.33 0 -7.66 -2.62 0 -7.38067 -4.07 0 -7.38067
  [4,16,-4.52,0,-7.43067,-6.33,0,-7.66,-2.62,0,-7.38067,-4.07,0,-7.38067],
// 4 16 -1.6 0 -6.98067 -2.74 0 -6.98067 -2.52 0 -7.11067 -1.82 0 -7.11067
  [4,16,-1.6,0,-6.98067,-2.74,0,-6.98067,-2.52,0,-7.11067,-1.82,0,-7.11067],
// 3 16 -1.82 0 -7.11067 -2.52 0 -7.11067 -2.17 0 -7.16067
  [3,16,-1.82,0,-7.11067,-2.52,0,-7.11067,-2.17,0,-7.16067],
// 3 16 2.39429 0 8.92 -8.97 0 8.52 1.53 0 8.82
  [3,16,2.39429,0,8.92,-8.97,0,8.52,1.53,0,8.82],
// 3 16 1.53 0 8.82 -8.97 0 8.52 0.88 0 8.57
  [3,16,1.53,0,8.82,-8.97,0,8.52,0.88,0,8.57],
// 3 16 0.88 0 8.57 -8.97 0 8.52 0.33 0 8.12
  [3,16,0.88,0,8.57,-8.97,0,8.52,0.33,0,8.12],
// 4 16 -0.12 0 7.52 0.33 0 8.12 -8.97 0 8.52 -7.57 0 7.22
  [4,16,-0.12,0,7.52,0.33,0,8.12,-8.97,0,8.52,-7.57,0,7.22],
// 4 16 -0.47 0 6.42 -0.12 0 7.52 -7.57 0 7.22 -6.27 0 6.02
  [4,16,-0.47,0,6.42,-0.12,0,7.52,-7.57,0,7.22,-6.27,0,6.02],
// 4 16 -0.57 0 3.67 -0.47 0 6.42 -6.27 0 6.02 -6.47 0 4.02
  [4,16,-0.57,0,3.67,-0.47,0,6.42,-6.27,0,6.02,-6.47,0,4.02],
// 4 16 -0.57 0 3.67 -6.47 0 4.02 -6.63 0 0.66 -0.52 0 1.02
  [4,16,-0.57,0,3.67,-6.47,0,4.02,-6.63,0,0.66,-0.52,0,1.02],
// 4 16 0.58 0 0.42 -0.52 0 1.02 -6.63 0 0.66 -2.62 0 -4.48
  [4,16,0.58,0,0.42,-0.52,0,1.02,-6.63,0,0.66,-2.62,0,-4.48],
// 4 16 -0.52 0 1.02 0.58 0 0.42 0.78 0 3.37 -0.07 0 4.67
  [4,16,-0.52,0,1.02,0.58,0,0.42,0.78,0,3.37,-0.07,0,4.67],
// 4 16 -0.07 0 4.67 0.78 0 3.37 0.93 0 5.02 0.03 0 6.42
  [4,16,-0.07,0,4.67,0.78,0,3.37,0.93,0,5.02,0.03,0,6.42],
// 4 16 0.03 0 6.42 0.93 0 5.02 2.03 0 6.02 0.33 0 7.52
  [4,16,0.03,0,6.42,0.93,0,5.02,2.03,0,6.02,0.33,0,7.52],
// 4 16 0.33 0 7.52 2.03 0 6.02 2.03 0 6.67 0.83 0 8.12
  [4,16,0.33,0,7.52,2.03,0,6.02,2.03,0,6.67,0.83,0,8.12],
// 4 16 0.83 0 8.12 2.03 0 6.67 2.13 0 6.97 1.53 0 8.62
  [4,16,0.83,0,8.12,2.03,0,6.67,2.13,0,6.97,1.53,0,8.62],
// 4 16 1.53 0 8.62 2.13 0 6.97 2.33 0 7.17 2.39429 0 8.72
  [4,16,1.53,0,8.62,2.13,0,6.97,2.33,0,7.17,2.39429,0,8.72],
// 4 16 2.39429 0 8.72 2.33 0 7.17 2.63 0 7.27 3.24429 0 8.62
  [4,16,2.39429,0,8.72,2.33,0,7.17,2.63,0,7.27,3.24429,0,8.62],
// 4 16 3.24429 0 8.62 2.63 0 7.27 2.83 0 7.27 3.94429 0 8.12
  [4,16,3.24429,0,8.62,2.63,0,7.27,2.83,0,7.27,3.94429,0,8.12],
// 4 16 3.94429 0 8.12 2.83 0 7.27 3.13 0 7.17 4.44429 0 7.52
  [4,16,3.94429,0,8.12,2.83,0,7.27,3.13,0,7.17,4.44429,0,7.52],
// 4 16 4.44429 0 7.52 3.13 0 7.17 3.33 0 6.97 4.74429 0 6.42
  [4,16,4.44429,0,7.52,3.13,0,7.17,3.33,0,6.97,4.74429,0,6.42],
// 3 16 3.33 0 6.97 3.43 0 6.67 4.74429 0 6.42
  [3,16,3.33,0,6.97,3.43,0,6.67,4.74429,0,6.42],
// 4 16 4.74429 0 6.42 3.43 0 6.67 3.43 0 6.02 4.005 0 5.02
  [4,16,4.74429,0,6.42,3.43,0,6.67,3.43,0,6.02,4.005,0,5.02],
// 4 16 2.03 0 6.67 2.03 0 6.02 3.43 0 6.02 3.43 0 6.67
  [4,16,2.03,0,6.67,2.03,0,6.02,3.43,0,6.02,3.43,0,6.67],
// 3 16 3.43 0 6.02 3.33 0 5.72 4.005 0 5.02
  [3,16,3.43,0,6.02,3.33,0,5.72,4.005,0,5.02],
// 3 16 3.33 0 5.72 3.13 0 5.52 4.005 0 5.02
  [3,16,3.33,0,5.72,3.13,0,5.52,4.005,0,5.02],
// 3 16 3.13 0 5.52 2.83 0 5.42 4.005 0 5.02
  [3,16,3.13,0,5.52,2.83,0,5.42,4.005,0,5.02],
// 4 16 4.005 0 5.02 2.83 0 5.42 2.63 0 5.42 0.93 0 5.02
  [4,16,4.005,0,5.02,2.83,0,5.42,2.63,0,5.42,0.93,0,5.02],
// 3 16 2.33 0 5.52 0.93 0 5.02 2.63 0 5.42
  [3,16,2.33,0,5.52,0.93,0,5.02,2.63,0,5.42],
// 3 16 2.13 0 5.72 0.93 0 5.02 2.33 0 5.52
  [3,16,2.13,0,5.72,0.93,0,5.02,2.33,0,5.52],
// 3 16 2.03 0 6.02 0.93 0 5.02 2.13 0 5.72
  [3,16,2.03,0,6.02,0.93,0,5.02,2.13,0,5.72],
// 3 16 -1.47 0 -7.26067 -1.72 0 -7.38067 6.34529 0 -7.6
  [3,16,-1.47,0,-7.26067,-1.72,0,-7.38067,6.34529,0,-7.6],
// 4 16 -1.32 0 -6.98067 -1.47 0 -7.26067 6.34529 0 -7.6 6.40529 0 -5.42
  [4,16,-1.32,0,-6.98067,-1.47,0,-7.26067,6.34529,0,-7.6,6.40529,0,-5.42],
// 3 16 6.40529 0 -5.42 -1.22 0 -5.93067 -1.32 0 -6.98067
  [3,16,6.40529,0,-5.42,-1.22,0,-5.93067,-1.32,0,-6.98067],
// 3 16 -1.32 0 -4.88 -1.22 0 -5.93067 6.40529 0 -5.42
  [3,16,-1.32,0,-4.88,-1.22,0,-5.93067,6.40529,0,-5.42],
// 4 16 -1.47 0 -4.6 -1.32 0 -4.88 6.40529 0 -5.42 6.62529 0 -2.46
  [4,16,-1.47,0,-4.6,-1.32,0,-4.88,6.40529,0,-5.42,6.62529,0,-2.46],
// 4 16 -1.72 0 -4.48 -1.47 0 -4.6 6.62529 0 -2.46 4.355 0 0.42
  [4,16,-1.72,0,-4.48,-1.47,0,-4.6,6.62529,0,-2.46,4.355,0,0.42],
// 4 16 -1.72 0 -4.48 4.355 0 0.42 0.58 0 0.42 -2.17 0 -4.43
  [4,16,-1.72,0,-4.48,4.355,0,0.42,0.58,0,0.42,-2.17,0,-4.43],
// 3 16 0.58 0 0.42 -2.62 0 -4.48 -2.17 0 -4.43
  [3,16,0.58,0,0.42,-2.62,0,-4.48,-2.17,0,-4.43],
// 4 16 -4.07 0 -4.48 -2.62 0 -4.48 -6.63 0 0.66 -6.61 0 -2.52
  [4,16,-4.07,0,-4.48,-2.62,0,-4.48,-6.63,0,0.66,-6.61,0,-2.52],
// 3 16 -6.61 0 -2.52 -4.52 0 -4.43 -4.07 0 -4.48
  [3,16,-6.61,0,-2.52,-4.52,0,-4.43,-4.07,0,-4.48],
// 3 16 -6.61 0 -2.52 -4.97 0 -4.48 -4.52 0 -4.43
  [3,16,-6.61,0,-2.52,-4.97,0,-4.48,-4.52,0,-4.43],
// 3 16 -6.61 0 -2.52 -5.22 0 -4.6 -4.97 0 -4.48
  [3,16,-6.61,0,-2.52,-5.22,0,-4.6,-4.97,0,-4.48],
// 3 16 -6.61 0 -2.52 -5.37 0 -4.88 -5.22 0 -4.6
  [3,16,-6.61,0,-2.52,-5.37,0,-4.88,-5.22,0,-4.6],
// 4 16 4.355 0 0.42 3.805 0 3.37 3.73 0 2 3.73 0 0.82
  [4,16,4.355,0,0.42,3.805,0,3.37,3.73,0,2,3.73,0,0.82],
// 3 16 3.73 0 0.82 3.48 0 0.82 4.355 0 0.42
  [3,16,3.73,0,0.82,3.48,0,0.82,4.355,0,0.42],
// 3 16 3.48 0 0.82 3.03 0 0.82 4.355 0 0.42
  [3,16,3.48,0,0.82,3.03,0,0.82,4.355,0,0.42],
// 4 16 4.355 0 0.42 3.03 0 0.82 2.78 0 0.82 0.58 0 0.42
  [4,16,4.355,0,0.42,3.03,0,0.82,2.78,0,0.82,0.58,0,0.42],
// 3 16 2.78 0 0.82 2.33 0 0.82 0.58 0 0.42
  [3,16,2.78,0,0.82,2.33,0,0.82,0.58,0,0.42],
// 3 16 2.33 0 0.82 2.08 0 0.82 0.58 0 0.42
  [3,16,2.33,0,0.82,2.08,0,0.82,0.58,0,0.42],
// 4 16 0.58 0 0.42 2.08 0 0.82 2.08 0 1.36 1.73 0 1.36
  [4,16,0.58,0,0.42,2.08,0,0.82,2.08,0,1.36,1.73,0,1.36],
// 3 16 1.58 0 1.52 0.58 0 0.42 1.73 0 1.36
  [3,16,1.58,0,1.52,0.58,0,0.42,1.73,0,1.36],
// 4 16 0.58 0 0.42 1.58 0 1.52 1.58 0 1.87 1.13 0 3.37
  [4,16,0.58,0,0.42,1.58,0,1.52,1.58,0,1.87,1.13,0,3.37],
// 3 16 1.13 0 3.37 1.58 0 1.87 1.73 0 2.02
  [3,16,1.13,0,3.37,1.58,0,1.87,1.73,0,2.02],
// 4 16 3.805 0 3.37 1.13 0 3.37 1.73 0 2.02 3.73 0 2
  [4,16,3.805,0,3.37,1.13,0,3.37,1.73,0,2.02,3.73,0,2],
// 4 16 3.48 0 0.82 3.48 0 1.67 3.03 0 1.67 3.03 0 0.82
  [4,16,3.48,0,0.82,3.48,0,1.67,3.03,0,1.67,3.03,0,0.82],
// 4 16 2.33 0 1.67 2.33 0 0.82 2.78 0 0.82 2.78 0 1.67
  [4,16,2.33,0,1.67,2.33,0,0.82,2.78,0,0.82,2.78,0,1.67],
// 4 16 -10 0 -10 -1.72 0 -7.38067 -2.17 0 -7.43067 -6.49 0 -7.94
  [4,16,-10,0,-10,-1.72,0,-7.38067,-2.17,0,-7.43067,-6.49,0,-7.94],
];
module ldraw_lib__3070bps4(step=0, col=false, unit=2/5, alt=false, line=0.2, solid=!$preview)
    makepoly(ldraw_lib__3070bps4(), step=step, col=col, unit=unit, alt=alt, line=line, solid=solid);
ldraw_lib__3070bps4(line=0.2);
